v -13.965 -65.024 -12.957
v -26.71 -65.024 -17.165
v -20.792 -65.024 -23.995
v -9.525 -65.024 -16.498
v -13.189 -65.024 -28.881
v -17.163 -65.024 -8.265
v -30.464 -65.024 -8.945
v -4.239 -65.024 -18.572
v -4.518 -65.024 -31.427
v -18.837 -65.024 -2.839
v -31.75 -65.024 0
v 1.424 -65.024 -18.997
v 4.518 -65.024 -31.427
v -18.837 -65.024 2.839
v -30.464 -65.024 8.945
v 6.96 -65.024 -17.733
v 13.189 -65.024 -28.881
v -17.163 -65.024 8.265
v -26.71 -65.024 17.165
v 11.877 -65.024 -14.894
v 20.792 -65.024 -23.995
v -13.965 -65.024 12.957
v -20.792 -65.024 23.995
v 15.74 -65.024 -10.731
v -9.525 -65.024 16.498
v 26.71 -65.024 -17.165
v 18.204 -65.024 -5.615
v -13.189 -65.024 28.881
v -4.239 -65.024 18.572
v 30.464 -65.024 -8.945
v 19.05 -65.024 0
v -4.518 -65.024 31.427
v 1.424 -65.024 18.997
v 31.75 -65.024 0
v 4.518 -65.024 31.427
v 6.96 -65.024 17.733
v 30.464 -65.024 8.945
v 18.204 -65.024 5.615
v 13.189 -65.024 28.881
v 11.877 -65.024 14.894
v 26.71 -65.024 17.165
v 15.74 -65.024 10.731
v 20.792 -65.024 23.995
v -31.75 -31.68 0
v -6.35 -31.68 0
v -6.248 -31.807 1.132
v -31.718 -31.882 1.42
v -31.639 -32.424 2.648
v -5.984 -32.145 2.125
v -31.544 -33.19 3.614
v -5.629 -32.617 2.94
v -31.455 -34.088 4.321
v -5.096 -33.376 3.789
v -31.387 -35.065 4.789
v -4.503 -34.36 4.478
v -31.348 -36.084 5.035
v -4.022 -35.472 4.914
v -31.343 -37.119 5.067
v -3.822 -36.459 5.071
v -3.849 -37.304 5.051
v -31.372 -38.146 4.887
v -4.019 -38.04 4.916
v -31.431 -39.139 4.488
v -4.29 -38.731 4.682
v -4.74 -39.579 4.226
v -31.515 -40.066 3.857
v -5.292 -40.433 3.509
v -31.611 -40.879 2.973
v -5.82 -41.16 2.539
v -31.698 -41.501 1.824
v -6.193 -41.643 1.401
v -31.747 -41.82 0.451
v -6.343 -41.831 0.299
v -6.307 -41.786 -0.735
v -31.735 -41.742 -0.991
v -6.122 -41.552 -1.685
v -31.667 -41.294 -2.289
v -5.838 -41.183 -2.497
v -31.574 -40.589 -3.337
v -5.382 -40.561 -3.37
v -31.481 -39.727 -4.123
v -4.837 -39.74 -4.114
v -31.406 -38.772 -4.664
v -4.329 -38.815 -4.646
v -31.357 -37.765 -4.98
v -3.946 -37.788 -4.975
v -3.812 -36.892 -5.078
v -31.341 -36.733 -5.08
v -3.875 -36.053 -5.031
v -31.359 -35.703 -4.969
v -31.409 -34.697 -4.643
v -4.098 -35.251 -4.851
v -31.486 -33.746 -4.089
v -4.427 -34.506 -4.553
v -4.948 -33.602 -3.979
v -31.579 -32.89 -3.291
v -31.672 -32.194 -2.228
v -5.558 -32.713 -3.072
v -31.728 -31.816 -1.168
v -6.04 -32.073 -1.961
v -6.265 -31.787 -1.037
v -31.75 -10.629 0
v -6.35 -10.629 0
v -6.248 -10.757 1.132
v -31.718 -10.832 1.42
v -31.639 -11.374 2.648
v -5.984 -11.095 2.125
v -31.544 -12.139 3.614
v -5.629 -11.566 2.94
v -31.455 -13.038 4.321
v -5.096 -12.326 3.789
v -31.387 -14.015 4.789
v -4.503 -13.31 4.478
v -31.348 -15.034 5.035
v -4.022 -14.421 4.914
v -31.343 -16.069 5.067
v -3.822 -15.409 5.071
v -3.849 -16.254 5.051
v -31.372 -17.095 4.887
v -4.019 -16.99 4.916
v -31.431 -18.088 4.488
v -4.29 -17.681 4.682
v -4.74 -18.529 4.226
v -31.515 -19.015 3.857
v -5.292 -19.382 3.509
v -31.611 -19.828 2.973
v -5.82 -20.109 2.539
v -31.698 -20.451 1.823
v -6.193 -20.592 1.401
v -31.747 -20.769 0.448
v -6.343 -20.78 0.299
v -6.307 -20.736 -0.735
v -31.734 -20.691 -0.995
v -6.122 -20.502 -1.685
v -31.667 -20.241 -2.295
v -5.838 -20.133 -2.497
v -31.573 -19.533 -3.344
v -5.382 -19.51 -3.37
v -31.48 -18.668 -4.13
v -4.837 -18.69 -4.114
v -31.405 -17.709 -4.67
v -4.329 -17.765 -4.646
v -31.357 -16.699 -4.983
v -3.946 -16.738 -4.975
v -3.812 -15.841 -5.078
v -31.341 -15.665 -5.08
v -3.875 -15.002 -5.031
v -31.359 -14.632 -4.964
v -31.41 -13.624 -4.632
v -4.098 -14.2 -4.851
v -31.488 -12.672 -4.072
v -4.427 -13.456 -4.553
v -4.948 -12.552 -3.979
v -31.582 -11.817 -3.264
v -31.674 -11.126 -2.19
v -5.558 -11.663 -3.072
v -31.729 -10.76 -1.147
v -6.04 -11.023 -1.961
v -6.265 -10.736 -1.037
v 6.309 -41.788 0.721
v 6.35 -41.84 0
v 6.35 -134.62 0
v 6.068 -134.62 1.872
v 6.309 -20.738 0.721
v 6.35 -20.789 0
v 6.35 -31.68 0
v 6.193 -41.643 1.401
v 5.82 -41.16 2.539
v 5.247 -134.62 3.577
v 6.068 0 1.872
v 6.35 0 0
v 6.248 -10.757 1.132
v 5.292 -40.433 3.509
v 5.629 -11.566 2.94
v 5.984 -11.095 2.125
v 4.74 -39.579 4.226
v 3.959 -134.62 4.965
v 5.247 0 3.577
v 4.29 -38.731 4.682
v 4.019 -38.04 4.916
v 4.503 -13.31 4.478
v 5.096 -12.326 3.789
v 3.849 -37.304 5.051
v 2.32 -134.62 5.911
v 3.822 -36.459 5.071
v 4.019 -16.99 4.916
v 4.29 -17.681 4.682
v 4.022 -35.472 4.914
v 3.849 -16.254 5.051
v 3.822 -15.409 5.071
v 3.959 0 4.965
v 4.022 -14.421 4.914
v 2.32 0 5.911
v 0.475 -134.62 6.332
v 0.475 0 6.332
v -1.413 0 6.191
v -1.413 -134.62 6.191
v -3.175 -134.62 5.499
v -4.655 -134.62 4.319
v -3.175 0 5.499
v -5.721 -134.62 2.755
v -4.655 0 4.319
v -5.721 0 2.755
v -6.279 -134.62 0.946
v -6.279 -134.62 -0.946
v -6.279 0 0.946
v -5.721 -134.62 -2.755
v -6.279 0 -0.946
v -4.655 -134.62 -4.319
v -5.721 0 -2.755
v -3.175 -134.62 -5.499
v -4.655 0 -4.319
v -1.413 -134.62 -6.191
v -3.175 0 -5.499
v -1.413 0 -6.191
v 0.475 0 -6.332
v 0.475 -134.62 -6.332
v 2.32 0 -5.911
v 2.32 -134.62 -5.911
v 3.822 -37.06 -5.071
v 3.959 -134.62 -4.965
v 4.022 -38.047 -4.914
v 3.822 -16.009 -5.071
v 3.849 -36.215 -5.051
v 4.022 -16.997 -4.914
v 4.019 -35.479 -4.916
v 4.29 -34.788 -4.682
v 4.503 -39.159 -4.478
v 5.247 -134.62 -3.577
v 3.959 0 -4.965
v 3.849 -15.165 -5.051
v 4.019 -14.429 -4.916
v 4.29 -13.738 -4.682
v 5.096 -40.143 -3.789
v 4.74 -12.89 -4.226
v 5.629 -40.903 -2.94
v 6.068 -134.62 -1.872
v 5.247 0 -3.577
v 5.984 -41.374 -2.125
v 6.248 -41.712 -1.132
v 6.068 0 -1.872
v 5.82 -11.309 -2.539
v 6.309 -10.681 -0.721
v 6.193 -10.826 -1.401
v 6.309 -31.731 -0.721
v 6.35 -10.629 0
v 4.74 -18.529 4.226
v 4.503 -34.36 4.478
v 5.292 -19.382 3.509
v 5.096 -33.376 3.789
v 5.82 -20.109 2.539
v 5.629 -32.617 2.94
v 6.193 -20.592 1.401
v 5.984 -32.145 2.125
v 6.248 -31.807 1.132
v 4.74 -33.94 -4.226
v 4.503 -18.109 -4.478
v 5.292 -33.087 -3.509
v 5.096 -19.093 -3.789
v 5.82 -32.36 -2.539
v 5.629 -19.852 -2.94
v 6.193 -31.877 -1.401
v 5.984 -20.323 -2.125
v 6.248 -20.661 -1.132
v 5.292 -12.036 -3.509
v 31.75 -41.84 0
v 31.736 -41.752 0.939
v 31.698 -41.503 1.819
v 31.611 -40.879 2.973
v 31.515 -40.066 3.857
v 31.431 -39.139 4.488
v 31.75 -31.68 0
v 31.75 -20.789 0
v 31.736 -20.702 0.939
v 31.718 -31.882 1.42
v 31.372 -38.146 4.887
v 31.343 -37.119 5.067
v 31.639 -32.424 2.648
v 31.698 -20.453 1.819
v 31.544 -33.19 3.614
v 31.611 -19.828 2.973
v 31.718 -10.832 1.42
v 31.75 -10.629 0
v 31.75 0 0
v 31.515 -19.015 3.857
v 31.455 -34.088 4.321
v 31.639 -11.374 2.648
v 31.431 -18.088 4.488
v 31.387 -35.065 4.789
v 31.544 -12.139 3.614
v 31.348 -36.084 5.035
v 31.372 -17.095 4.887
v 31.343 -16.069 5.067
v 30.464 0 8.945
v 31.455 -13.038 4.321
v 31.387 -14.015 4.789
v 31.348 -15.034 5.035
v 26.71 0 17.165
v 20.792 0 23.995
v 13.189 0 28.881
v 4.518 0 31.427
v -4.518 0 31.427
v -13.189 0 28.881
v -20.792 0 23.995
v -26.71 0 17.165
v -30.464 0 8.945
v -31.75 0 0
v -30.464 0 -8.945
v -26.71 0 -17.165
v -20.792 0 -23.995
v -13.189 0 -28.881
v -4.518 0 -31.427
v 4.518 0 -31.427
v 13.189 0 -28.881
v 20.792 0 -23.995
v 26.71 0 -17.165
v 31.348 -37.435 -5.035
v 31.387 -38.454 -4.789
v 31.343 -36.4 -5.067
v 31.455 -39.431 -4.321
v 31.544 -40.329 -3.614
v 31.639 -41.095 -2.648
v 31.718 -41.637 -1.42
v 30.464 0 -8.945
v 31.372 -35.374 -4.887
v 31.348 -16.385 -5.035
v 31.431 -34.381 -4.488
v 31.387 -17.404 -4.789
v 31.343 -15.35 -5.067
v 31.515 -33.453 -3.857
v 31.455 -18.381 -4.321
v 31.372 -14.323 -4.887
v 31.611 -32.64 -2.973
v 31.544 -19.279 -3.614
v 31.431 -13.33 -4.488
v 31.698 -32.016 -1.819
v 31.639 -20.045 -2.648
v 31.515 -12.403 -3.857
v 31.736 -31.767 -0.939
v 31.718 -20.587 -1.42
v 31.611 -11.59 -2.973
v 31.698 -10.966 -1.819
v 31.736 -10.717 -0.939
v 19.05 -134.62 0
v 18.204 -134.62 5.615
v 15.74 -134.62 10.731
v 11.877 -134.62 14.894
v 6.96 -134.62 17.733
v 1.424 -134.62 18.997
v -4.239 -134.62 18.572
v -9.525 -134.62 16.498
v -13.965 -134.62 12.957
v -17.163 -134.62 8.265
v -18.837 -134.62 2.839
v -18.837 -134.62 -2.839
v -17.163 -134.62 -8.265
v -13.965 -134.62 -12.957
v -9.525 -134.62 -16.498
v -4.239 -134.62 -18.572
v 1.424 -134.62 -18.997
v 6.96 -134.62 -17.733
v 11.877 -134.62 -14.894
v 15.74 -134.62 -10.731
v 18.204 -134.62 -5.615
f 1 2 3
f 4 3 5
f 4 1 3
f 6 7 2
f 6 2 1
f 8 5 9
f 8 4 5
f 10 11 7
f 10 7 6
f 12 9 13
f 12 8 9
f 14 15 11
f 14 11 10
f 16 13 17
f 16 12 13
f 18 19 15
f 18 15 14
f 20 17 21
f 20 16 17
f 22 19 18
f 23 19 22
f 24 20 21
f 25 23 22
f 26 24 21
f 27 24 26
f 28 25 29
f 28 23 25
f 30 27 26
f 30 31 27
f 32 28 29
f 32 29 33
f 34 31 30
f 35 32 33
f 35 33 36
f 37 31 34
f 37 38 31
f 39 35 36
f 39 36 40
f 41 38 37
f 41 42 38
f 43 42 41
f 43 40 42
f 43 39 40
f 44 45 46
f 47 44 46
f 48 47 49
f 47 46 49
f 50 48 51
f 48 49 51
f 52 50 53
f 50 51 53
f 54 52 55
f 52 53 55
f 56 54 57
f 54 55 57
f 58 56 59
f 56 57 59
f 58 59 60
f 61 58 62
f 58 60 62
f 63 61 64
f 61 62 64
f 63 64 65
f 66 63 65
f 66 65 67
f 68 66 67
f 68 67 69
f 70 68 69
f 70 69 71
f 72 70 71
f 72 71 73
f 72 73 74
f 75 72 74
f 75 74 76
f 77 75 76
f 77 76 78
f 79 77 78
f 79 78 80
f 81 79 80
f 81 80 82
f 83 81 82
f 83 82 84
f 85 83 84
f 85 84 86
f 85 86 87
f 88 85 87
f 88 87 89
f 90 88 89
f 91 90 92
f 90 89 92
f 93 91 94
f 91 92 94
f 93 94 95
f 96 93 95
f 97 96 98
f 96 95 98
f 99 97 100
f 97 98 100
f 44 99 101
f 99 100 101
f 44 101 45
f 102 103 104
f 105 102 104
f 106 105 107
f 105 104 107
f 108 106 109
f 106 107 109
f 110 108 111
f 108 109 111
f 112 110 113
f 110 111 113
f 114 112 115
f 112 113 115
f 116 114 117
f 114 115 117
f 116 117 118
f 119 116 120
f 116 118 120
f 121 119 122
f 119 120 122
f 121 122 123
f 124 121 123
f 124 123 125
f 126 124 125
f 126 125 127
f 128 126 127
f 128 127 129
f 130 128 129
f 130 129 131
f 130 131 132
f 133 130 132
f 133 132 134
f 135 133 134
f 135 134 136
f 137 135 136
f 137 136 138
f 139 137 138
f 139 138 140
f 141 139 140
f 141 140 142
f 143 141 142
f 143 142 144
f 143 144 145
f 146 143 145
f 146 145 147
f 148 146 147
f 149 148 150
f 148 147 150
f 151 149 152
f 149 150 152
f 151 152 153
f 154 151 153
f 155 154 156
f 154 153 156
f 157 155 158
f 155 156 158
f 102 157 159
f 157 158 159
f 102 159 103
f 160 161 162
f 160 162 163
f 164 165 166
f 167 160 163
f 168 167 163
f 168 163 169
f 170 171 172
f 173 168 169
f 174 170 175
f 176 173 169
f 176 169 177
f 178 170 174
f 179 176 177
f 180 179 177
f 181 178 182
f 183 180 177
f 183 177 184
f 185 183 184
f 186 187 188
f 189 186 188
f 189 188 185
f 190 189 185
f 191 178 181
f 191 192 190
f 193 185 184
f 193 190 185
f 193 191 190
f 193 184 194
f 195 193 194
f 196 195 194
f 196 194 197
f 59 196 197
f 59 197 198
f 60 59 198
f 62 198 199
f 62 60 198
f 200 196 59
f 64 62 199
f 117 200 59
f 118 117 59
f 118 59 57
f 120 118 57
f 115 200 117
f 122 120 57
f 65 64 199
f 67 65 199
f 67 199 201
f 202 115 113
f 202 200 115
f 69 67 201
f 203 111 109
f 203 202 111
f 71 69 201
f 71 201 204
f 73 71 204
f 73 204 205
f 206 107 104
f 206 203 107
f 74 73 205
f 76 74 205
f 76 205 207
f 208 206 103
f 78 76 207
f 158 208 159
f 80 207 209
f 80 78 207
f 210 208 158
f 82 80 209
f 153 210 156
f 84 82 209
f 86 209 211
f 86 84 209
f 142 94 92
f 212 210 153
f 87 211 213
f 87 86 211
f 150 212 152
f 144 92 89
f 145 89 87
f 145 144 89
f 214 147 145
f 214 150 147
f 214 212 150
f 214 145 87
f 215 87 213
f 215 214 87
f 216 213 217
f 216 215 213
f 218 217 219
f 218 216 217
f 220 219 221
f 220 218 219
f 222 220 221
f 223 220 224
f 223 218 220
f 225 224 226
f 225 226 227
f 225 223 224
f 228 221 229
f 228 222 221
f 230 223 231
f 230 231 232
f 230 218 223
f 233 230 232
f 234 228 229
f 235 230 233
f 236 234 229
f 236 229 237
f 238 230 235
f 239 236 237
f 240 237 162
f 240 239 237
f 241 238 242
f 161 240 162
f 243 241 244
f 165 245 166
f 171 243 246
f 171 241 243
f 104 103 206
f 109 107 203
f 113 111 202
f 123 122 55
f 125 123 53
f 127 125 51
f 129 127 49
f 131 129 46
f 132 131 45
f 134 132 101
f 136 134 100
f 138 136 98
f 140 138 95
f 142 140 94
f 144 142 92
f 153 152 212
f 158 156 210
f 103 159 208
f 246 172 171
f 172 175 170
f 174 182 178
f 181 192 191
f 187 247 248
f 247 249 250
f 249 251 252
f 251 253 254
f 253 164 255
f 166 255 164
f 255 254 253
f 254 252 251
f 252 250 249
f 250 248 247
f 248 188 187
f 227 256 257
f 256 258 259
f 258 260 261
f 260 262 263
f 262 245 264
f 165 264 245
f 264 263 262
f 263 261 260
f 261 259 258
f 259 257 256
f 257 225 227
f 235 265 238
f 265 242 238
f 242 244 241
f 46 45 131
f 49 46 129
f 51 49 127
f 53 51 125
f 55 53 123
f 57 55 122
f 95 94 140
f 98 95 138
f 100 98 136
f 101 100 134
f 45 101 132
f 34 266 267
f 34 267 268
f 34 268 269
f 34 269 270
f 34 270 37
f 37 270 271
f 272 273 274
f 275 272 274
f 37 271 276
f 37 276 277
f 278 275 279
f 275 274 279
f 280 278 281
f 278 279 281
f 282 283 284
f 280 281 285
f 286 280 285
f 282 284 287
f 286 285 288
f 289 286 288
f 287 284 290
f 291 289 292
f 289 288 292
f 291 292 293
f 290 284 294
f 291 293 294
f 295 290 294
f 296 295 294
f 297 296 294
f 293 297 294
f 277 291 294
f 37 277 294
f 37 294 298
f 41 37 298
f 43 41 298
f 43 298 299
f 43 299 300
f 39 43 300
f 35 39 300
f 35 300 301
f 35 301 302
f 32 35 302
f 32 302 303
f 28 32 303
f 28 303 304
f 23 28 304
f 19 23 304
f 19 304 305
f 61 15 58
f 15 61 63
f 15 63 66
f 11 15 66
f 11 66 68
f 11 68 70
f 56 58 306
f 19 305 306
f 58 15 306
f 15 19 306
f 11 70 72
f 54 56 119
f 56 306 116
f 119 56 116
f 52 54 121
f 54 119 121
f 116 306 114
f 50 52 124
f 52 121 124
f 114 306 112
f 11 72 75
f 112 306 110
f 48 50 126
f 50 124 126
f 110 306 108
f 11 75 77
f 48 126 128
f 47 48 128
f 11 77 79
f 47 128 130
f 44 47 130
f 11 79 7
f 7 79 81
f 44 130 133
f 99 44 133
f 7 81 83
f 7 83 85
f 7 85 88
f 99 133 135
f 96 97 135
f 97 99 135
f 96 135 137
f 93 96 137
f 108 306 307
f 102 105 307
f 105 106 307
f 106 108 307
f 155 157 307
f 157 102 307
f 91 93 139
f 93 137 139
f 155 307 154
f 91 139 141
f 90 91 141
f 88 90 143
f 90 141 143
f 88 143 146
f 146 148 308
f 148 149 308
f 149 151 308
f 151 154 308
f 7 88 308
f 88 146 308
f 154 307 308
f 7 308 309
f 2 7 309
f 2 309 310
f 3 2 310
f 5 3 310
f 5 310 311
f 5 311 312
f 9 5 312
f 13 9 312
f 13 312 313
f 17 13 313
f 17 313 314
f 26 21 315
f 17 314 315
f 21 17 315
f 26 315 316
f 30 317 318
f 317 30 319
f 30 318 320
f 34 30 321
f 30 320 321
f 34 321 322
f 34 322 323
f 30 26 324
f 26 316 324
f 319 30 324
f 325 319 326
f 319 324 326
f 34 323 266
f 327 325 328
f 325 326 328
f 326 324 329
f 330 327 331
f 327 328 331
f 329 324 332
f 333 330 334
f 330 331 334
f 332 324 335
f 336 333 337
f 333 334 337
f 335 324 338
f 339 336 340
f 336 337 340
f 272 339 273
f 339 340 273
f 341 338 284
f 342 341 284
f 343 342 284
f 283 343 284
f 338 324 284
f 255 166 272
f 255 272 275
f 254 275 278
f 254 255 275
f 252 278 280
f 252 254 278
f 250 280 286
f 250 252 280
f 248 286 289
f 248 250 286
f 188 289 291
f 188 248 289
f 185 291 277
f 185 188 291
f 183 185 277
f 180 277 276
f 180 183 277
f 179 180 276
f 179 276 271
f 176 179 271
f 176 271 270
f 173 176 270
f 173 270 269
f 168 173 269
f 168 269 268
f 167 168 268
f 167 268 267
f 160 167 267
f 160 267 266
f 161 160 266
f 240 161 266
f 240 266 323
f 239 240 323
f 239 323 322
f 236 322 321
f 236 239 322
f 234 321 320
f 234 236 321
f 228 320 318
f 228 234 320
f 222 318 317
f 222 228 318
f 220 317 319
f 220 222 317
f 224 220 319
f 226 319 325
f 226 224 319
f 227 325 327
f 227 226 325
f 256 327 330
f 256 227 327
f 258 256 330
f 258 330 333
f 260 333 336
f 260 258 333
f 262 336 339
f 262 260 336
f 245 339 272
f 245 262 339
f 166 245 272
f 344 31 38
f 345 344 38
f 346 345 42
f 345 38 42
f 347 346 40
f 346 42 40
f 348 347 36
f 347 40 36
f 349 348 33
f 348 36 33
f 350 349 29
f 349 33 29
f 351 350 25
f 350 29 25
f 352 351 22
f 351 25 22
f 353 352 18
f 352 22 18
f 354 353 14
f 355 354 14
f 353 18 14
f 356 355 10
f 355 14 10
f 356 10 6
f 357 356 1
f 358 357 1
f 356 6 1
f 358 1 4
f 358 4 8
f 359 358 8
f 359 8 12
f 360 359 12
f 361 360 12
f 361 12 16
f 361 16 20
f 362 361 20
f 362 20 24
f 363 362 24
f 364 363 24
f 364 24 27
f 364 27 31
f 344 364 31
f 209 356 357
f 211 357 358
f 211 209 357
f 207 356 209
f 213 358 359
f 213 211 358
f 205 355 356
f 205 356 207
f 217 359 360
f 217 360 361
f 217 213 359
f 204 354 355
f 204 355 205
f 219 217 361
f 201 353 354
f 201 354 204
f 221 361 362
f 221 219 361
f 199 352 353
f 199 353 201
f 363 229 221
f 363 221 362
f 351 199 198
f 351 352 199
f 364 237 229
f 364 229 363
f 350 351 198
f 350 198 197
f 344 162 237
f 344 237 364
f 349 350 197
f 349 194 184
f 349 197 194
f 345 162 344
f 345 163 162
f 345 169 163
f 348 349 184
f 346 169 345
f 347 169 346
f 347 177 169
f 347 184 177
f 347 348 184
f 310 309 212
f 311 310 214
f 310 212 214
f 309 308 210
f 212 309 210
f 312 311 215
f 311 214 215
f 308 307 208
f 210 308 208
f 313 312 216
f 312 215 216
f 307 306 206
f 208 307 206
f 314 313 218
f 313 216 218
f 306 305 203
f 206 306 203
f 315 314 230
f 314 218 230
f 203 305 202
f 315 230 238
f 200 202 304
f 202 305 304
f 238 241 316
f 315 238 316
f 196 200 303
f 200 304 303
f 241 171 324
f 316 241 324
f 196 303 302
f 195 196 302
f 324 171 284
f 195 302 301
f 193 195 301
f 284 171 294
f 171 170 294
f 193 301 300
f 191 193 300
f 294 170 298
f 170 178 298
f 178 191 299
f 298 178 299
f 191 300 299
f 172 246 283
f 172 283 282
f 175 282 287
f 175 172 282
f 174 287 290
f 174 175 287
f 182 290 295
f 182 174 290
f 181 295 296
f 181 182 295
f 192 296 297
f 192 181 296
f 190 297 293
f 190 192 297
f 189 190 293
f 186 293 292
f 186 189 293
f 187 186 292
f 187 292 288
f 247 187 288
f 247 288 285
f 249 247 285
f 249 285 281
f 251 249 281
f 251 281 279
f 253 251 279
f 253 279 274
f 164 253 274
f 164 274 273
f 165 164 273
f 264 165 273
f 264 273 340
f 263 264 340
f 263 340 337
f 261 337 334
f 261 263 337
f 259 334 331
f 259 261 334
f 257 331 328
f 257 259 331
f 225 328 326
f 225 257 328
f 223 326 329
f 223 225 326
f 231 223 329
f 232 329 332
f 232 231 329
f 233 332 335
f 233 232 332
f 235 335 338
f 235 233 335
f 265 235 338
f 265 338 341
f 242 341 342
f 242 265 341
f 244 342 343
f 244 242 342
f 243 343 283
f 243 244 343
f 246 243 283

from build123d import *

# Parameters (mm, degrees)
F0_R     = 19.05
F0_R_2   = 6.35
F1_DEPTH = 134.62
F0_R_3   = 31.75
F2_DEPTH = 65.024
F3_R     = 5.08
F4_DEPTH = 114.3
F5_DEPTH = 89.662


with BuildPart() as f1:
    # F0 (on Front) → F1 (new body)
    with BuildSketch(Plane.XZ):
        Circle(F0_R)
        Circle(F0_R_2, mode=Mode.SUBTRACT)
    extrude(amount=F1_DEPTH)

    # F0 (on Front) → F2 (join)
    with BuildSketch(Plane.XZ):
        Circle(F0_R_3)
        Circle(F0_R, mode=Mode.SUBTRACT)
    extrude(amount=F2_DEPTH)

    # F3 (on Right) → F4 (cut)
    with BuildSketch(Plane.YZ):
        with Locations((-15.709256, 0)):
            Circle(F3_R)
        with Locations((-36.759584, 0)):
            Circle(F3_R)
    extrude(amount=-F4_DEPTH, mode=Mode.SUBTRACT)

    # F3 (on Right) → F5 (cut)
    with BuildSketch(Plane.YZ):
        with Locations((-15.709256, 0)):
            Circle(F3_R)
        with Locations((-36.759584, 0)):
            Circle(F3_R)
    extrude(amount=F5_DEPTH, mode=Mode.SUBTRACT)


solid = f1.part
